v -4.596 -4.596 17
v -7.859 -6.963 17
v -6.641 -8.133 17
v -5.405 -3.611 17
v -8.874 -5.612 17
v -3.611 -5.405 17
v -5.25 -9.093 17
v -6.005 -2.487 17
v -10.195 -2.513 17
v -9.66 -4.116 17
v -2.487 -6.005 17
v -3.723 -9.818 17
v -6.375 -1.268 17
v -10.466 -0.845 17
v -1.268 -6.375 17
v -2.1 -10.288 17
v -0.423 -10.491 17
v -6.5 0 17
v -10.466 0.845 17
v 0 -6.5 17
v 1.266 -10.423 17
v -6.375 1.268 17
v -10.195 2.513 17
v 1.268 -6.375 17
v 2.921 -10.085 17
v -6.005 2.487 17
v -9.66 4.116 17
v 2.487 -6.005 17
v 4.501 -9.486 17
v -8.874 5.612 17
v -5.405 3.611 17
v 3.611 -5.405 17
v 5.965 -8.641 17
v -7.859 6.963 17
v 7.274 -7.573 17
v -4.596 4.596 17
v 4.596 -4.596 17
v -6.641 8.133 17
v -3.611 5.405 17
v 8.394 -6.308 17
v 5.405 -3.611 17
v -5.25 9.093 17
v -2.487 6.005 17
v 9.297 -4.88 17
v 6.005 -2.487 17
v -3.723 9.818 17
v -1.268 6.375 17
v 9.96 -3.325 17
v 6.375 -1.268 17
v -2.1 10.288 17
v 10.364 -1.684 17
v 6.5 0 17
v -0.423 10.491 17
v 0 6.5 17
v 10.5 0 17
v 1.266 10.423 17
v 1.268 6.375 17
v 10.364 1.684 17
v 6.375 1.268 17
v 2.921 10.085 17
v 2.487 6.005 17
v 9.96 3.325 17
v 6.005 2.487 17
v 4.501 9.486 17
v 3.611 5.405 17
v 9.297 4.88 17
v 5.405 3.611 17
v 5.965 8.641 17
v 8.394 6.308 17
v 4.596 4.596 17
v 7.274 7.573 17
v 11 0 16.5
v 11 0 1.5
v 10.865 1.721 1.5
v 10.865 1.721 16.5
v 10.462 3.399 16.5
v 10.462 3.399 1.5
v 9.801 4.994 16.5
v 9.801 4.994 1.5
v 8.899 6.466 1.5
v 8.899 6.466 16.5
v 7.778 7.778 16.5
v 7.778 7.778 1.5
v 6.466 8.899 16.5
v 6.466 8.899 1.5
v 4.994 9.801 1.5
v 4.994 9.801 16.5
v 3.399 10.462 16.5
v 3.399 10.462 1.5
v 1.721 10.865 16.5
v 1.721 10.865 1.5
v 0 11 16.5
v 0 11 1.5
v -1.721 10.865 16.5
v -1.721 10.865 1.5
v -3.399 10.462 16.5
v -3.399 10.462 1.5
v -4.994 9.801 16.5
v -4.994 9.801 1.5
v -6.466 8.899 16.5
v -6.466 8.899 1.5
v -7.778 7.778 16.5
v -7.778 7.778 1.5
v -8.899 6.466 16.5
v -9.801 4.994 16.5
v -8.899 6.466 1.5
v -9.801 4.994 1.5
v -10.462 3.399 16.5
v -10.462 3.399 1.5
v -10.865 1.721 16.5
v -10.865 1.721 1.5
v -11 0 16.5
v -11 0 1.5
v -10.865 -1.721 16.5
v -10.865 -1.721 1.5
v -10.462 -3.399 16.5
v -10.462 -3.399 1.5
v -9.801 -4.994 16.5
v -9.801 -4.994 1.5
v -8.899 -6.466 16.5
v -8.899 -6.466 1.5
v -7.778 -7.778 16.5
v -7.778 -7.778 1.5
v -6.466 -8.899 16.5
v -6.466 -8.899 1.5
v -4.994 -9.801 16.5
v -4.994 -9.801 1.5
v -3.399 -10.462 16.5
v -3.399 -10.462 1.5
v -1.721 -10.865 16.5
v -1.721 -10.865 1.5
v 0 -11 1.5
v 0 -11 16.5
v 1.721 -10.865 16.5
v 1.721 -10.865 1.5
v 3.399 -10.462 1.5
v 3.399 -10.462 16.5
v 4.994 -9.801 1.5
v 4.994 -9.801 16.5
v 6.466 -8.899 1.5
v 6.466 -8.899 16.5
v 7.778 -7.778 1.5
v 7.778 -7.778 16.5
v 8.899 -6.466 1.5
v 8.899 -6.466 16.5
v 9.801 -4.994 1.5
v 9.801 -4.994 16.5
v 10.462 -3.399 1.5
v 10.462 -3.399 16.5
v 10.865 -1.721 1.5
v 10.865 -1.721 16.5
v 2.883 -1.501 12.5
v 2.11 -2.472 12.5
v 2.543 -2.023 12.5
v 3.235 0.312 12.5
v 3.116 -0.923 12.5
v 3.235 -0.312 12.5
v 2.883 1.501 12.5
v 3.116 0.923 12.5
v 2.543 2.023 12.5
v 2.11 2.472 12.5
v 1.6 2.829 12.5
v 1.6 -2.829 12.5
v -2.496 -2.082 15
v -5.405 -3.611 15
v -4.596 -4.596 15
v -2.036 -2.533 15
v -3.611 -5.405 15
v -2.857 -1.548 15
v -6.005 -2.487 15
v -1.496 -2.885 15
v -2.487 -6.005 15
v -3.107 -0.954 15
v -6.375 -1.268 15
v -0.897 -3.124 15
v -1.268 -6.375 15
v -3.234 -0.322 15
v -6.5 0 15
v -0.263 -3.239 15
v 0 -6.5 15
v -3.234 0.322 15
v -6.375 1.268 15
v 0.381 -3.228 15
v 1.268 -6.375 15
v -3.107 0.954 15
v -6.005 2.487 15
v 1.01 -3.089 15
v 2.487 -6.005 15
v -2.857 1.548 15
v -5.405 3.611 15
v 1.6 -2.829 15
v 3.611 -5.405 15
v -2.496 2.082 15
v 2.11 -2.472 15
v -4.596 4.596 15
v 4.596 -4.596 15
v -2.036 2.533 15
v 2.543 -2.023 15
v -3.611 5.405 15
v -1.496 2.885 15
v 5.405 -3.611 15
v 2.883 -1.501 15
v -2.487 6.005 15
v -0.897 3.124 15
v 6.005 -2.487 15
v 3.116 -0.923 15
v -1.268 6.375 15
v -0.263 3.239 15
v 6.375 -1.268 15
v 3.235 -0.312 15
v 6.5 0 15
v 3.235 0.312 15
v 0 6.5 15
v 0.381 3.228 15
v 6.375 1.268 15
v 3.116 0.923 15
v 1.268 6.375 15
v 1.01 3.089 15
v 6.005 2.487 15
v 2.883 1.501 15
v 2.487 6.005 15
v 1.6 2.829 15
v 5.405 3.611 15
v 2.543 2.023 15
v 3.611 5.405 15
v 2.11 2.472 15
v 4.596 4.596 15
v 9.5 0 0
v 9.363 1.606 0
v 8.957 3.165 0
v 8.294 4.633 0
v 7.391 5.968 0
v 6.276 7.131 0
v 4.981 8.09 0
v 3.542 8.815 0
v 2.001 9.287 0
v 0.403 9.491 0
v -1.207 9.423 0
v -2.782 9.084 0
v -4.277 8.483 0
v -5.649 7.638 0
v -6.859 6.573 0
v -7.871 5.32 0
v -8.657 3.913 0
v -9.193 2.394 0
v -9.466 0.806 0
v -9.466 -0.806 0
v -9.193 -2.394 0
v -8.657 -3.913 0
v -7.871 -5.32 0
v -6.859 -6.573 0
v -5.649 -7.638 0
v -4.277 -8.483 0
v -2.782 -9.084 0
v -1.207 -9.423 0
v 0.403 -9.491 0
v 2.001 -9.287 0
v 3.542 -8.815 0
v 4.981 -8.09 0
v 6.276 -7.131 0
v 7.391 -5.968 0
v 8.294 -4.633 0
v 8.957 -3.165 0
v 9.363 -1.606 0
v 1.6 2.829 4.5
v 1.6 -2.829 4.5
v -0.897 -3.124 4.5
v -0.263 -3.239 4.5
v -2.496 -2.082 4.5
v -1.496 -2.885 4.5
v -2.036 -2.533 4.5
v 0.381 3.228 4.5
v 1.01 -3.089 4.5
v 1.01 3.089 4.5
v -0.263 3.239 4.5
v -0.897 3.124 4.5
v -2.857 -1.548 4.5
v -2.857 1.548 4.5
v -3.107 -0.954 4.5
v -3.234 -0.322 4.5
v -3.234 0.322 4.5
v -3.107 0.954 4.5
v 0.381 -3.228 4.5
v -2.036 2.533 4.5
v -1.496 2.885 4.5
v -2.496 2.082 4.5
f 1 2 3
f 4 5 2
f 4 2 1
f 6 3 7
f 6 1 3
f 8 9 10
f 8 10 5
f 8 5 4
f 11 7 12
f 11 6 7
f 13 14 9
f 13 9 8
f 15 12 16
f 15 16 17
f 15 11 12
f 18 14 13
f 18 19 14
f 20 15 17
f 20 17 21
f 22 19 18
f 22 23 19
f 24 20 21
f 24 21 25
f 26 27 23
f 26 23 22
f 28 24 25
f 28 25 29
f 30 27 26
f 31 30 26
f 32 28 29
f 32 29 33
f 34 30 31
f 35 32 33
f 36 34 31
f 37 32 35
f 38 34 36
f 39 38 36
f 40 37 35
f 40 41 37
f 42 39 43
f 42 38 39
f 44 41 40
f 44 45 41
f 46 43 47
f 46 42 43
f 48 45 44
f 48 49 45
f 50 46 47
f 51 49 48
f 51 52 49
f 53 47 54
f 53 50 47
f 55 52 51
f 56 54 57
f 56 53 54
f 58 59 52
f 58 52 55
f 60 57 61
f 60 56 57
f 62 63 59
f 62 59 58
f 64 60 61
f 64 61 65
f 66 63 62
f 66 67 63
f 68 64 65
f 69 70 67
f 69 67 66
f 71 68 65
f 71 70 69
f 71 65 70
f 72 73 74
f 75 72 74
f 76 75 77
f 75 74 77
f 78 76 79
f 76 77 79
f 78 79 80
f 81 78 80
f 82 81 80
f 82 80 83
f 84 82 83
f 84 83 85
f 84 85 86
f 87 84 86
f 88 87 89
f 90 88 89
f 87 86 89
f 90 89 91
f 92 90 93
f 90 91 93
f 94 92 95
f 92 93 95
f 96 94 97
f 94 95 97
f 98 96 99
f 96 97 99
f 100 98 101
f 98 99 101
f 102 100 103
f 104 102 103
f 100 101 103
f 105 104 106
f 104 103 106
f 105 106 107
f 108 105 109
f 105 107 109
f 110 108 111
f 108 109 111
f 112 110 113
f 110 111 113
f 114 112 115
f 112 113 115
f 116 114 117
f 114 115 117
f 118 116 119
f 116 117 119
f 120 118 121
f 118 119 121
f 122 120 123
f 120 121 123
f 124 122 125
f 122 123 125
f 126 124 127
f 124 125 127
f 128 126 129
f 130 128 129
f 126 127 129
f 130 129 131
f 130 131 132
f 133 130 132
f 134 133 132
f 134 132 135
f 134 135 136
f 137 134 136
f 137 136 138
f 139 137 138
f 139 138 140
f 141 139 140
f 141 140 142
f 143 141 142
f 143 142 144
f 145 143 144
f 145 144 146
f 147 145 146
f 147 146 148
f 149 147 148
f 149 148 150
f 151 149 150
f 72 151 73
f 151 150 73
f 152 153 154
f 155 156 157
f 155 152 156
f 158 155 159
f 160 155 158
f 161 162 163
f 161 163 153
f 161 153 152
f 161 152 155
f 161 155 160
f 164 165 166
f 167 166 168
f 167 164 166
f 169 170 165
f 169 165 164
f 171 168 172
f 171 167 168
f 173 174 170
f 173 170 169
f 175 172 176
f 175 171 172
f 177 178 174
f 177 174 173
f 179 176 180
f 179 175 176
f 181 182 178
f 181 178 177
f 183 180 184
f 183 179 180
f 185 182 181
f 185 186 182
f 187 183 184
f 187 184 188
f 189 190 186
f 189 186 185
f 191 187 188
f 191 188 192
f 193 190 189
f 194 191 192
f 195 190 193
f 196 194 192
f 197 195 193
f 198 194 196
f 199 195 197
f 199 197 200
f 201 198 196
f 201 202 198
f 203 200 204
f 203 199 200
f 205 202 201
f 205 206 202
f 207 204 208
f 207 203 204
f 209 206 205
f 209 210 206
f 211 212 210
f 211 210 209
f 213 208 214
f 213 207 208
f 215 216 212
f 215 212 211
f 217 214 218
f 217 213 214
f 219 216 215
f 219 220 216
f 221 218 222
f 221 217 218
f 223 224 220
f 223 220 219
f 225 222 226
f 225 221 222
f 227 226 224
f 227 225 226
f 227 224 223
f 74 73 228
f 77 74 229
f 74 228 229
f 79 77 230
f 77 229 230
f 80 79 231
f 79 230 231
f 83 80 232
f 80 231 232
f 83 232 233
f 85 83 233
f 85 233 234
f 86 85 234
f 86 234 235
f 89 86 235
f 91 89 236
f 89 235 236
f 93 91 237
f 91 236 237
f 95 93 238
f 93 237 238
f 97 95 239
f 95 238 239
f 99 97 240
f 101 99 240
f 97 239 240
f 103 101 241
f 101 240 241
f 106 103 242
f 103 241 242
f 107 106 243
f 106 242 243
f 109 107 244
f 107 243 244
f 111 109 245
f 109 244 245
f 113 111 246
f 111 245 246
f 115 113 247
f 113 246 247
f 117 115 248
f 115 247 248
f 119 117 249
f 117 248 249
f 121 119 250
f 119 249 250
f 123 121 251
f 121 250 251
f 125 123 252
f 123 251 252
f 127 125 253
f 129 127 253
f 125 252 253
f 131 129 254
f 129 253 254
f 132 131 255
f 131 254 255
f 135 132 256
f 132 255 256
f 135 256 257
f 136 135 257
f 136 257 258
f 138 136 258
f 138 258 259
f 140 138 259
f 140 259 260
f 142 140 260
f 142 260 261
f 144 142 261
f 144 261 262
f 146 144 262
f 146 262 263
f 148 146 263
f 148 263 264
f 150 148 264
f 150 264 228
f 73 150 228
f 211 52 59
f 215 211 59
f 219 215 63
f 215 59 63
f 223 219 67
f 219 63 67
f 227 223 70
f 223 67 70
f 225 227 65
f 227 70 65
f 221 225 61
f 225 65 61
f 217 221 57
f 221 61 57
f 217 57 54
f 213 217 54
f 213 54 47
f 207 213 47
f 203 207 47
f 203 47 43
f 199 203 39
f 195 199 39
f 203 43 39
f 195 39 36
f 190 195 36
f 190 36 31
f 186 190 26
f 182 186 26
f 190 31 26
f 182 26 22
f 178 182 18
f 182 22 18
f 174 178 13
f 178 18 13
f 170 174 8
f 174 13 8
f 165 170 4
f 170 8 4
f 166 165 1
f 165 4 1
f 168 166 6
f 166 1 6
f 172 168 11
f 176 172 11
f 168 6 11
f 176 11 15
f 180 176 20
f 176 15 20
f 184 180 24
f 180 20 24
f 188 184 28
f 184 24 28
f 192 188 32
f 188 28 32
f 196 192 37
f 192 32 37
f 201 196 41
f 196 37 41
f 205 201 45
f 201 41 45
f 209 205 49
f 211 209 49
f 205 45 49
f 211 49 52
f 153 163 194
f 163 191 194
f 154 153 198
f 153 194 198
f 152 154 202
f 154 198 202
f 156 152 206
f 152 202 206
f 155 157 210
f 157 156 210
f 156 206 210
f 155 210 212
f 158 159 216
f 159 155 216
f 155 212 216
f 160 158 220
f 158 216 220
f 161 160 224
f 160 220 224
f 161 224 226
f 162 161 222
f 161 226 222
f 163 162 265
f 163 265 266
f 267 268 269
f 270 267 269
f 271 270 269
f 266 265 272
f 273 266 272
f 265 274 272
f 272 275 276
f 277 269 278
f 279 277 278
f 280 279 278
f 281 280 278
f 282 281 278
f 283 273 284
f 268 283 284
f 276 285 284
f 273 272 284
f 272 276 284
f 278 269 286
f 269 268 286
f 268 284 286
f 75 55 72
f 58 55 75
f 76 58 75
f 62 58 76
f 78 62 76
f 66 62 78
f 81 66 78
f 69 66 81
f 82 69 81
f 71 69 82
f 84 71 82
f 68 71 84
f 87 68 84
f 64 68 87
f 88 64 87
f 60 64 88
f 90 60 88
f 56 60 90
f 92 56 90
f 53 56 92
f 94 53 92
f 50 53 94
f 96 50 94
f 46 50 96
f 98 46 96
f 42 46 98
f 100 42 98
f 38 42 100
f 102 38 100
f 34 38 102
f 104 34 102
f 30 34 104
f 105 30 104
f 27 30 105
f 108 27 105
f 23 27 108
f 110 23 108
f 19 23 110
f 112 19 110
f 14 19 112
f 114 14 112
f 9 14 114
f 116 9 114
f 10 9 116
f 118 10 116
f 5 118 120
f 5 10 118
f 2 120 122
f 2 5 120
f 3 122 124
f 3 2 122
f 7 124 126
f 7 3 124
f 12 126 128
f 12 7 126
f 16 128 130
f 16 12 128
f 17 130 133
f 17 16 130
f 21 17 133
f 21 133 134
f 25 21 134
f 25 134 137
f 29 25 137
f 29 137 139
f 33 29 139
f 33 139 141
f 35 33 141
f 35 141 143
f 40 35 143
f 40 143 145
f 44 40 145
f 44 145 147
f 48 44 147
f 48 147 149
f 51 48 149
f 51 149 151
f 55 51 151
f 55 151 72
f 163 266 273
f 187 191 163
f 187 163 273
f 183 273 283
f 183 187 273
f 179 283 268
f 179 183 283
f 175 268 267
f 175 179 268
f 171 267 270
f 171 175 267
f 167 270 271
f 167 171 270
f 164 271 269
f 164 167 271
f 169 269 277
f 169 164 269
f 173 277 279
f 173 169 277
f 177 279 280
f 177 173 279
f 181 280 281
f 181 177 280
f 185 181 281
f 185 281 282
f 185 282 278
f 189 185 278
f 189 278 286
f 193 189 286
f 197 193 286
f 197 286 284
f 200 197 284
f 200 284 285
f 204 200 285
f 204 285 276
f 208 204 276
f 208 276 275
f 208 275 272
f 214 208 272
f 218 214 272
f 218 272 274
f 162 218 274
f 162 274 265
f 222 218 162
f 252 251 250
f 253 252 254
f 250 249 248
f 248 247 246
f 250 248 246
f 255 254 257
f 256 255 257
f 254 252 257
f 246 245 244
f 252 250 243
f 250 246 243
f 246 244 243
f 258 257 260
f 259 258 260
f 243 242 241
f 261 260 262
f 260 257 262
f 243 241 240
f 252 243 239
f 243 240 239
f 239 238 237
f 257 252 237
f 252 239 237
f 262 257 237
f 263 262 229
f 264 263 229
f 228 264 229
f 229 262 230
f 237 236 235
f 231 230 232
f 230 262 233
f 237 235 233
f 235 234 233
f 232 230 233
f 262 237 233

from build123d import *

# Parameters (mm, degrees)
SKETCH1_R           = 11
BOSS_EXTRUDE1_DEPTH = 17
CUT_EXTRUDE1_DEPTH  = 12.5
SKETCH3_R           = 6.5
CUT_EXTRUDE2_DEPTH  = 2
SKETCH4_R           = 3.25
CUT_EXTRUDE3_DEPTH  = 4.5
CHAMFER1_SIZE       = 1.5
CHAMFER2_SIZE       = 0.5


with BuildPart() as part:
    # Sketch1 → Boss-Extrude1 (new body)
    with BuildSketch(Plane.XY):
        Circle(SKETCH1_R)
    extrude(amount=BOSS_EXTRUDE1_DEPTH)

    # Sketch2 → Cut-Extrude1 (cut)
    with BuildSketch(Plane.XY.offset(17)):
        with BuildLine():
            Line((1.6, 2.828869032), (1.6, -2.828869032))
            ThreePointArc((1.6, -2.828869032), (-3.25, 0), (1.6, 2.828869032))
        make_face()
    extrude(amount=-CUT_EXTRUDE1_DEPTH, mode=Mode.SUBTRACT)

    # Sketch3 → Cut-Extrude2 (cut)
    with BuildSketch(Plane.XY.offset(17)):
        Circle(SKETCH3_R)
    extrude(amount=-CUT_EXTRUDE2_DEPTH, mode=Mode.SUBTRACT)

    # Sketch4 → Cut-Extrude3 (cut)
    with BuildSketch(Plane.XY.offset(17)):
        Circle(SKETCH4_R)
    extrude(amount=-CUT_EXTRUDE3_DEPTH, mode=Mode.SUBTRACT)

    # Chamfer1
    chamfer1_edges = [part.edges().sort_by_distance(p)[0] for p in [
        (-11, 0, 0),
    ]]
    chamfer(chamfer1_edges, length=CHAMFER1_SIZE)

    # Chamfer2
    chamfer2_edges = [part.edges().sort_by_distance(p)[0] for p in [
        (-11, 0, 17),
    ]]
    chamfer(chamfer2_edges, length=CHAMFER2_SIZE)


solid = part.part
